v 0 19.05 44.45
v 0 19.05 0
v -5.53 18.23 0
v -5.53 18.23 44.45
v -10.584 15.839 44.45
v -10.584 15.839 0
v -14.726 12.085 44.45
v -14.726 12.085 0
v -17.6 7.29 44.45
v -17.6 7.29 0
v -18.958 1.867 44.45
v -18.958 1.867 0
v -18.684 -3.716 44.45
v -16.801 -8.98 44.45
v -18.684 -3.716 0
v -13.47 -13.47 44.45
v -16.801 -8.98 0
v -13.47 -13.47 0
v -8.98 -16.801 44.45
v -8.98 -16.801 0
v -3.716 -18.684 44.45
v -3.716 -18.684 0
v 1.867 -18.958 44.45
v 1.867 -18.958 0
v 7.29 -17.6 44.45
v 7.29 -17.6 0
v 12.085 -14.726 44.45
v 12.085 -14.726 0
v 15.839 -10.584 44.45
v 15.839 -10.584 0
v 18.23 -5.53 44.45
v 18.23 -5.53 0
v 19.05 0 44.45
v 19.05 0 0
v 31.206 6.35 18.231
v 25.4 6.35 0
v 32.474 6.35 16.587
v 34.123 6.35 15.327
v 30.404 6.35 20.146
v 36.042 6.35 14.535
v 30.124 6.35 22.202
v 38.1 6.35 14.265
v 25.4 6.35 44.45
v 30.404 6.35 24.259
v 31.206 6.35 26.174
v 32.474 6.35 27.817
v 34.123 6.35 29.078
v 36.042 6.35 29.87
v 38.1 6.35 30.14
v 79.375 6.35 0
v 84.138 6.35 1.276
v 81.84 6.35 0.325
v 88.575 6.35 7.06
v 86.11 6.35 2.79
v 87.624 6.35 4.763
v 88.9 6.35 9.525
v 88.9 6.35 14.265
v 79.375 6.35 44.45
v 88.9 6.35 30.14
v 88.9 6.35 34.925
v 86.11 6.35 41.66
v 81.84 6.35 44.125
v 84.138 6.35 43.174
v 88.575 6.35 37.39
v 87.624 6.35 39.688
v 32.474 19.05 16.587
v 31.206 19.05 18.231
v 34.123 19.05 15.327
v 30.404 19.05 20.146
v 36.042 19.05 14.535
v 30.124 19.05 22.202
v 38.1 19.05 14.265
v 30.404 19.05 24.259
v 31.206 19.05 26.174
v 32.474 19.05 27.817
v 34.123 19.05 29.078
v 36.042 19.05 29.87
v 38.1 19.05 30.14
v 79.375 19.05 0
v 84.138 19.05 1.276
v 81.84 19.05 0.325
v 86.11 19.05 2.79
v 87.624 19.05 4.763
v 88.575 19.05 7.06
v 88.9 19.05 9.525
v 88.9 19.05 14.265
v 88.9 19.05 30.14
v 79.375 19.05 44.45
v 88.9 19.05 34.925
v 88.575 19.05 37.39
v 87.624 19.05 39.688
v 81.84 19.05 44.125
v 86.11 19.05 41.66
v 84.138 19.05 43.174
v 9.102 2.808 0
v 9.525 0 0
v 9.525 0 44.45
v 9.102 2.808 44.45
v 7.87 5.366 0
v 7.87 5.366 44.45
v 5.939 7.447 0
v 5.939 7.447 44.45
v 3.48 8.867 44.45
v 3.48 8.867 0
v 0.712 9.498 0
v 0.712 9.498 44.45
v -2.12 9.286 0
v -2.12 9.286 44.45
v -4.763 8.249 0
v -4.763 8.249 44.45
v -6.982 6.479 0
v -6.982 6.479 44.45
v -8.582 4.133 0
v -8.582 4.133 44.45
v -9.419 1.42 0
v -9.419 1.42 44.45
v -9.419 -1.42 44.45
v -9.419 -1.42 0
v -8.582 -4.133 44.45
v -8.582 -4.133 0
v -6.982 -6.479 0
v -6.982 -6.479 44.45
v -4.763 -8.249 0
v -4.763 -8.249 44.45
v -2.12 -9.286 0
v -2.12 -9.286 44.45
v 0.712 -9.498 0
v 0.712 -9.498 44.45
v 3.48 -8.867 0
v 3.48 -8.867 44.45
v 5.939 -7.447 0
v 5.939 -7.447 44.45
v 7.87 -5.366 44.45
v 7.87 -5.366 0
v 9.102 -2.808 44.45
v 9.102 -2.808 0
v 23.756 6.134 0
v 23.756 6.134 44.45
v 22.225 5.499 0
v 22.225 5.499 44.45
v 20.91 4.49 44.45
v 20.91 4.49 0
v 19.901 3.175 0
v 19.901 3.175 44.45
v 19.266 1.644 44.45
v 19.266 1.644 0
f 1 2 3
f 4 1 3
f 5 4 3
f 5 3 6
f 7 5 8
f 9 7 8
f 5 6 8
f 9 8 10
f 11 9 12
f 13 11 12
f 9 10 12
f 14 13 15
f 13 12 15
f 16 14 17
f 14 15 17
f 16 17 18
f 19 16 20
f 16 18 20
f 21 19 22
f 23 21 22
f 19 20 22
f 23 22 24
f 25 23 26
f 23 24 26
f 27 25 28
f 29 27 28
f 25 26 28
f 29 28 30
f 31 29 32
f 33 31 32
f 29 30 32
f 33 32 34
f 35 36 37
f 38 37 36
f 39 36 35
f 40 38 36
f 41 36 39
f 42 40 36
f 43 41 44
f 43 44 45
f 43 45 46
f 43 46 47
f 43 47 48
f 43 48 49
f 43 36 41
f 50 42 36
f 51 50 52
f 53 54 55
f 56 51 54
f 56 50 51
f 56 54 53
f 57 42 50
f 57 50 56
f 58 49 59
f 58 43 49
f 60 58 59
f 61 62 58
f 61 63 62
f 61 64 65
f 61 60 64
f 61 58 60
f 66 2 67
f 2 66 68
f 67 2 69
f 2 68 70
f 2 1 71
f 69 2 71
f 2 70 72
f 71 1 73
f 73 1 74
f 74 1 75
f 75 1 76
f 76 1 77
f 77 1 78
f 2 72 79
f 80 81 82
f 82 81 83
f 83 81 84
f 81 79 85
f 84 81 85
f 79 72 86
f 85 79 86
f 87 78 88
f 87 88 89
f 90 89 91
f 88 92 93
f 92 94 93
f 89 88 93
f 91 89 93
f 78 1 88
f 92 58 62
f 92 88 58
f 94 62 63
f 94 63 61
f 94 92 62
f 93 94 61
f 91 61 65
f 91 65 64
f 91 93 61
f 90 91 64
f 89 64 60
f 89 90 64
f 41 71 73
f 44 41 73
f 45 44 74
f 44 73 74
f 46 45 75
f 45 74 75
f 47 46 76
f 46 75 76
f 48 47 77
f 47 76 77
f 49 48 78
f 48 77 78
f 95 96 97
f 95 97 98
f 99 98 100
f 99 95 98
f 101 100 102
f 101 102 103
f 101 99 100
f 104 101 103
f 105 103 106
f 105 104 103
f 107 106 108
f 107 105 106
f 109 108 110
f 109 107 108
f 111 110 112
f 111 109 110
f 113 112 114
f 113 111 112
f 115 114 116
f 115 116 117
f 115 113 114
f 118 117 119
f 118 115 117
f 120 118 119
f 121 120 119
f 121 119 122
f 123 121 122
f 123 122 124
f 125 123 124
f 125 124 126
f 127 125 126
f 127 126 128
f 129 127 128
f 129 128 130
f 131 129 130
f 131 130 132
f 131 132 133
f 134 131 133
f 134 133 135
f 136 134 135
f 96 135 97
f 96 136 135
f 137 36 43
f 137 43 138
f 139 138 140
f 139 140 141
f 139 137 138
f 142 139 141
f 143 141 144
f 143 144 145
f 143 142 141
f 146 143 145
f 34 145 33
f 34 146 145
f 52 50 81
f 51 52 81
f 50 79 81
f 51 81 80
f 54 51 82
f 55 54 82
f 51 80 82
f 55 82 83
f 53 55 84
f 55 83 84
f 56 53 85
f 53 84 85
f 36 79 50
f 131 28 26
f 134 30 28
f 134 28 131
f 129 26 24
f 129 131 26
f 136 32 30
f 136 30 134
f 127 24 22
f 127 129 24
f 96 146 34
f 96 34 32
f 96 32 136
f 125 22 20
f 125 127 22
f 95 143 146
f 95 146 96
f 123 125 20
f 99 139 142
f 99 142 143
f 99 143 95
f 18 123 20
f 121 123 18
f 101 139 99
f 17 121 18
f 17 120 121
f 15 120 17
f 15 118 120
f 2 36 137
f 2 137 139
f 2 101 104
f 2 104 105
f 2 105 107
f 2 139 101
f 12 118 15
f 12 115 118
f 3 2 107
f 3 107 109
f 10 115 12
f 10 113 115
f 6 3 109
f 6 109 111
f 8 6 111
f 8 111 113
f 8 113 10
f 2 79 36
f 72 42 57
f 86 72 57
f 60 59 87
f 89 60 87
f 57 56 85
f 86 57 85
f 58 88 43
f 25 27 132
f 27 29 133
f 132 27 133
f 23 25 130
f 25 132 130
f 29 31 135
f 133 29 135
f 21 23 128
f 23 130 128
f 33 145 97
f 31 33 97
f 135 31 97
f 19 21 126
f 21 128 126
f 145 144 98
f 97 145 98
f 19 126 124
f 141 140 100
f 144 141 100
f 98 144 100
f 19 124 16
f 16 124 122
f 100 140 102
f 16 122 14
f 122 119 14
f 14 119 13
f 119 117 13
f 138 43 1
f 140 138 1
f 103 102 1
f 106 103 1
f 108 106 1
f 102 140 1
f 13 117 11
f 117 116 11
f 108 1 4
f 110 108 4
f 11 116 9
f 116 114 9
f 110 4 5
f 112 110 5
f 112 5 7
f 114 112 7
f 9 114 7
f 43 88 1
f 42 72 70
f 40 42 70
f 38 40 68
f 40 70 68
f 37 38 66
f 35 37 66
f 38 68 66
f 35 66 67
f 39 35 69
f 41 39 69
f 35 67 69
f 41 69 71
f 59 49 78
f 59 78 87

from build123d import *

# Parameters (mm, degrees)
F0_R        = 9.525
F1_DEPTH    = 44.45
F2_T1_DEPTH = 44.45
F3_R        = 9.525
F4_W        = 58.7756
F4_H        = 15.875
F5_DEPTH    = 25.4
F6_T1_DEPTH = 12.7


# Not quite as in the source:
# - a fillet or chamfer that OpenCascade refuses, or shapes differently, is made with other operations: its cross-section is extruded or revolved along the edge and cut away or added


with BuildPart() as f1:
    # F0 (on Top) → F1 (new body)
    with BuildSketch(Plane.XY):
        with BuildLine():
            ThreePointArc((0, 19.05), (10.9985226281, 15.5542598667), (17.9605122421, 6.35))
            Line((17.9605122421, 6.35), (88.9, 6.35))
            Line((88.9, 6.35), (88.9, 19.05))
            Line((88.9, 19.05), (0, 19.05))
        make_face()
        with BuildLine():
            ThreePointArc((0, 19.05), (-13.4703841816, -13.4703841816), (19.05, 0))
            ThreePointArc((19.05, 0), (18.7756525614, 3.2213926947), (17.9605122421, 6.35))
            ThreePointArc((17.9605122421, 6.35), (10.9985226281, 15.5542598667), (0, 19.05))
        make_face()
        Circle(F0_R, mode=Mode.SUBTRACT)
    extrude(amount=F1_DEPTH)

    # F2: fillet of radius 6.35 on 1 edges, made by hand

    # F2_s2 → F2_t1 (join)
    with BuildSketch(Plane.XY):
        with BuildLine():
            ThreePointArc((25.4, 6.35), (20.9098719395, 4.4901280605), (19.05, 0))
            ThreePointArc((19.05, 0), (18.7756525614, 3.2213926947), (17.9605122421, 6.35))
            Line((17.9605122421, 6.35), (25.4, 6.35))
        make_face()
    extrude(amount=F2_T1_DEPTH)

    # F3
    f3_edges = [f1.edges().sort_by_distance(p)[0] for p in [
        (88.9, 12.7, 44.45),
        (88.9, 12.7, 0),
    ]]
    fillet(f3_edges, radius=F3_R)

    # F4 (on face) → F5 (cut)
    with BuildSketch(Plane.XZ.offset(-6.35)):
        with Locations((59.5122, 22.2023769543)):
            Rectangle(F4_W, F4_H)
    extrude(amount=-F5_DEPTH, mode=Mode.SUBTRACT)

    # F6: fillet of radius 7.9756 on 2 edges, made by hand

    # F6_s2 → F6_t1 (join)
    with BuildSketch(Plane.XZ.offset(-19.05)):
        with BuildLine():
            ThreePointArc((30.1244, 22.1642769543), (32.460399156, 27.8038777983), (38.1, 30.1398769543))
            Line((38.1, 30.1398769543), (30.1244, 30.1398769543))
            Line((30.1244, 30.1398769543), (30.1244, 22.1642769543))
        make_face()
        with BuildLine():
            ThreePointArc((38.1, 14.2648769543), (32.460399156, 16.6008761102), (30.1244, 22.2404769543))
            Line((30.1244, 22.2404769543), (30.1244, 14.2648769543))
            Line((30.1244, 14.2648769543), (38.1, 14.2648769543))
        make_face()
    extrude(amount=F6_T1_DEPTH)


solid = f1.part
